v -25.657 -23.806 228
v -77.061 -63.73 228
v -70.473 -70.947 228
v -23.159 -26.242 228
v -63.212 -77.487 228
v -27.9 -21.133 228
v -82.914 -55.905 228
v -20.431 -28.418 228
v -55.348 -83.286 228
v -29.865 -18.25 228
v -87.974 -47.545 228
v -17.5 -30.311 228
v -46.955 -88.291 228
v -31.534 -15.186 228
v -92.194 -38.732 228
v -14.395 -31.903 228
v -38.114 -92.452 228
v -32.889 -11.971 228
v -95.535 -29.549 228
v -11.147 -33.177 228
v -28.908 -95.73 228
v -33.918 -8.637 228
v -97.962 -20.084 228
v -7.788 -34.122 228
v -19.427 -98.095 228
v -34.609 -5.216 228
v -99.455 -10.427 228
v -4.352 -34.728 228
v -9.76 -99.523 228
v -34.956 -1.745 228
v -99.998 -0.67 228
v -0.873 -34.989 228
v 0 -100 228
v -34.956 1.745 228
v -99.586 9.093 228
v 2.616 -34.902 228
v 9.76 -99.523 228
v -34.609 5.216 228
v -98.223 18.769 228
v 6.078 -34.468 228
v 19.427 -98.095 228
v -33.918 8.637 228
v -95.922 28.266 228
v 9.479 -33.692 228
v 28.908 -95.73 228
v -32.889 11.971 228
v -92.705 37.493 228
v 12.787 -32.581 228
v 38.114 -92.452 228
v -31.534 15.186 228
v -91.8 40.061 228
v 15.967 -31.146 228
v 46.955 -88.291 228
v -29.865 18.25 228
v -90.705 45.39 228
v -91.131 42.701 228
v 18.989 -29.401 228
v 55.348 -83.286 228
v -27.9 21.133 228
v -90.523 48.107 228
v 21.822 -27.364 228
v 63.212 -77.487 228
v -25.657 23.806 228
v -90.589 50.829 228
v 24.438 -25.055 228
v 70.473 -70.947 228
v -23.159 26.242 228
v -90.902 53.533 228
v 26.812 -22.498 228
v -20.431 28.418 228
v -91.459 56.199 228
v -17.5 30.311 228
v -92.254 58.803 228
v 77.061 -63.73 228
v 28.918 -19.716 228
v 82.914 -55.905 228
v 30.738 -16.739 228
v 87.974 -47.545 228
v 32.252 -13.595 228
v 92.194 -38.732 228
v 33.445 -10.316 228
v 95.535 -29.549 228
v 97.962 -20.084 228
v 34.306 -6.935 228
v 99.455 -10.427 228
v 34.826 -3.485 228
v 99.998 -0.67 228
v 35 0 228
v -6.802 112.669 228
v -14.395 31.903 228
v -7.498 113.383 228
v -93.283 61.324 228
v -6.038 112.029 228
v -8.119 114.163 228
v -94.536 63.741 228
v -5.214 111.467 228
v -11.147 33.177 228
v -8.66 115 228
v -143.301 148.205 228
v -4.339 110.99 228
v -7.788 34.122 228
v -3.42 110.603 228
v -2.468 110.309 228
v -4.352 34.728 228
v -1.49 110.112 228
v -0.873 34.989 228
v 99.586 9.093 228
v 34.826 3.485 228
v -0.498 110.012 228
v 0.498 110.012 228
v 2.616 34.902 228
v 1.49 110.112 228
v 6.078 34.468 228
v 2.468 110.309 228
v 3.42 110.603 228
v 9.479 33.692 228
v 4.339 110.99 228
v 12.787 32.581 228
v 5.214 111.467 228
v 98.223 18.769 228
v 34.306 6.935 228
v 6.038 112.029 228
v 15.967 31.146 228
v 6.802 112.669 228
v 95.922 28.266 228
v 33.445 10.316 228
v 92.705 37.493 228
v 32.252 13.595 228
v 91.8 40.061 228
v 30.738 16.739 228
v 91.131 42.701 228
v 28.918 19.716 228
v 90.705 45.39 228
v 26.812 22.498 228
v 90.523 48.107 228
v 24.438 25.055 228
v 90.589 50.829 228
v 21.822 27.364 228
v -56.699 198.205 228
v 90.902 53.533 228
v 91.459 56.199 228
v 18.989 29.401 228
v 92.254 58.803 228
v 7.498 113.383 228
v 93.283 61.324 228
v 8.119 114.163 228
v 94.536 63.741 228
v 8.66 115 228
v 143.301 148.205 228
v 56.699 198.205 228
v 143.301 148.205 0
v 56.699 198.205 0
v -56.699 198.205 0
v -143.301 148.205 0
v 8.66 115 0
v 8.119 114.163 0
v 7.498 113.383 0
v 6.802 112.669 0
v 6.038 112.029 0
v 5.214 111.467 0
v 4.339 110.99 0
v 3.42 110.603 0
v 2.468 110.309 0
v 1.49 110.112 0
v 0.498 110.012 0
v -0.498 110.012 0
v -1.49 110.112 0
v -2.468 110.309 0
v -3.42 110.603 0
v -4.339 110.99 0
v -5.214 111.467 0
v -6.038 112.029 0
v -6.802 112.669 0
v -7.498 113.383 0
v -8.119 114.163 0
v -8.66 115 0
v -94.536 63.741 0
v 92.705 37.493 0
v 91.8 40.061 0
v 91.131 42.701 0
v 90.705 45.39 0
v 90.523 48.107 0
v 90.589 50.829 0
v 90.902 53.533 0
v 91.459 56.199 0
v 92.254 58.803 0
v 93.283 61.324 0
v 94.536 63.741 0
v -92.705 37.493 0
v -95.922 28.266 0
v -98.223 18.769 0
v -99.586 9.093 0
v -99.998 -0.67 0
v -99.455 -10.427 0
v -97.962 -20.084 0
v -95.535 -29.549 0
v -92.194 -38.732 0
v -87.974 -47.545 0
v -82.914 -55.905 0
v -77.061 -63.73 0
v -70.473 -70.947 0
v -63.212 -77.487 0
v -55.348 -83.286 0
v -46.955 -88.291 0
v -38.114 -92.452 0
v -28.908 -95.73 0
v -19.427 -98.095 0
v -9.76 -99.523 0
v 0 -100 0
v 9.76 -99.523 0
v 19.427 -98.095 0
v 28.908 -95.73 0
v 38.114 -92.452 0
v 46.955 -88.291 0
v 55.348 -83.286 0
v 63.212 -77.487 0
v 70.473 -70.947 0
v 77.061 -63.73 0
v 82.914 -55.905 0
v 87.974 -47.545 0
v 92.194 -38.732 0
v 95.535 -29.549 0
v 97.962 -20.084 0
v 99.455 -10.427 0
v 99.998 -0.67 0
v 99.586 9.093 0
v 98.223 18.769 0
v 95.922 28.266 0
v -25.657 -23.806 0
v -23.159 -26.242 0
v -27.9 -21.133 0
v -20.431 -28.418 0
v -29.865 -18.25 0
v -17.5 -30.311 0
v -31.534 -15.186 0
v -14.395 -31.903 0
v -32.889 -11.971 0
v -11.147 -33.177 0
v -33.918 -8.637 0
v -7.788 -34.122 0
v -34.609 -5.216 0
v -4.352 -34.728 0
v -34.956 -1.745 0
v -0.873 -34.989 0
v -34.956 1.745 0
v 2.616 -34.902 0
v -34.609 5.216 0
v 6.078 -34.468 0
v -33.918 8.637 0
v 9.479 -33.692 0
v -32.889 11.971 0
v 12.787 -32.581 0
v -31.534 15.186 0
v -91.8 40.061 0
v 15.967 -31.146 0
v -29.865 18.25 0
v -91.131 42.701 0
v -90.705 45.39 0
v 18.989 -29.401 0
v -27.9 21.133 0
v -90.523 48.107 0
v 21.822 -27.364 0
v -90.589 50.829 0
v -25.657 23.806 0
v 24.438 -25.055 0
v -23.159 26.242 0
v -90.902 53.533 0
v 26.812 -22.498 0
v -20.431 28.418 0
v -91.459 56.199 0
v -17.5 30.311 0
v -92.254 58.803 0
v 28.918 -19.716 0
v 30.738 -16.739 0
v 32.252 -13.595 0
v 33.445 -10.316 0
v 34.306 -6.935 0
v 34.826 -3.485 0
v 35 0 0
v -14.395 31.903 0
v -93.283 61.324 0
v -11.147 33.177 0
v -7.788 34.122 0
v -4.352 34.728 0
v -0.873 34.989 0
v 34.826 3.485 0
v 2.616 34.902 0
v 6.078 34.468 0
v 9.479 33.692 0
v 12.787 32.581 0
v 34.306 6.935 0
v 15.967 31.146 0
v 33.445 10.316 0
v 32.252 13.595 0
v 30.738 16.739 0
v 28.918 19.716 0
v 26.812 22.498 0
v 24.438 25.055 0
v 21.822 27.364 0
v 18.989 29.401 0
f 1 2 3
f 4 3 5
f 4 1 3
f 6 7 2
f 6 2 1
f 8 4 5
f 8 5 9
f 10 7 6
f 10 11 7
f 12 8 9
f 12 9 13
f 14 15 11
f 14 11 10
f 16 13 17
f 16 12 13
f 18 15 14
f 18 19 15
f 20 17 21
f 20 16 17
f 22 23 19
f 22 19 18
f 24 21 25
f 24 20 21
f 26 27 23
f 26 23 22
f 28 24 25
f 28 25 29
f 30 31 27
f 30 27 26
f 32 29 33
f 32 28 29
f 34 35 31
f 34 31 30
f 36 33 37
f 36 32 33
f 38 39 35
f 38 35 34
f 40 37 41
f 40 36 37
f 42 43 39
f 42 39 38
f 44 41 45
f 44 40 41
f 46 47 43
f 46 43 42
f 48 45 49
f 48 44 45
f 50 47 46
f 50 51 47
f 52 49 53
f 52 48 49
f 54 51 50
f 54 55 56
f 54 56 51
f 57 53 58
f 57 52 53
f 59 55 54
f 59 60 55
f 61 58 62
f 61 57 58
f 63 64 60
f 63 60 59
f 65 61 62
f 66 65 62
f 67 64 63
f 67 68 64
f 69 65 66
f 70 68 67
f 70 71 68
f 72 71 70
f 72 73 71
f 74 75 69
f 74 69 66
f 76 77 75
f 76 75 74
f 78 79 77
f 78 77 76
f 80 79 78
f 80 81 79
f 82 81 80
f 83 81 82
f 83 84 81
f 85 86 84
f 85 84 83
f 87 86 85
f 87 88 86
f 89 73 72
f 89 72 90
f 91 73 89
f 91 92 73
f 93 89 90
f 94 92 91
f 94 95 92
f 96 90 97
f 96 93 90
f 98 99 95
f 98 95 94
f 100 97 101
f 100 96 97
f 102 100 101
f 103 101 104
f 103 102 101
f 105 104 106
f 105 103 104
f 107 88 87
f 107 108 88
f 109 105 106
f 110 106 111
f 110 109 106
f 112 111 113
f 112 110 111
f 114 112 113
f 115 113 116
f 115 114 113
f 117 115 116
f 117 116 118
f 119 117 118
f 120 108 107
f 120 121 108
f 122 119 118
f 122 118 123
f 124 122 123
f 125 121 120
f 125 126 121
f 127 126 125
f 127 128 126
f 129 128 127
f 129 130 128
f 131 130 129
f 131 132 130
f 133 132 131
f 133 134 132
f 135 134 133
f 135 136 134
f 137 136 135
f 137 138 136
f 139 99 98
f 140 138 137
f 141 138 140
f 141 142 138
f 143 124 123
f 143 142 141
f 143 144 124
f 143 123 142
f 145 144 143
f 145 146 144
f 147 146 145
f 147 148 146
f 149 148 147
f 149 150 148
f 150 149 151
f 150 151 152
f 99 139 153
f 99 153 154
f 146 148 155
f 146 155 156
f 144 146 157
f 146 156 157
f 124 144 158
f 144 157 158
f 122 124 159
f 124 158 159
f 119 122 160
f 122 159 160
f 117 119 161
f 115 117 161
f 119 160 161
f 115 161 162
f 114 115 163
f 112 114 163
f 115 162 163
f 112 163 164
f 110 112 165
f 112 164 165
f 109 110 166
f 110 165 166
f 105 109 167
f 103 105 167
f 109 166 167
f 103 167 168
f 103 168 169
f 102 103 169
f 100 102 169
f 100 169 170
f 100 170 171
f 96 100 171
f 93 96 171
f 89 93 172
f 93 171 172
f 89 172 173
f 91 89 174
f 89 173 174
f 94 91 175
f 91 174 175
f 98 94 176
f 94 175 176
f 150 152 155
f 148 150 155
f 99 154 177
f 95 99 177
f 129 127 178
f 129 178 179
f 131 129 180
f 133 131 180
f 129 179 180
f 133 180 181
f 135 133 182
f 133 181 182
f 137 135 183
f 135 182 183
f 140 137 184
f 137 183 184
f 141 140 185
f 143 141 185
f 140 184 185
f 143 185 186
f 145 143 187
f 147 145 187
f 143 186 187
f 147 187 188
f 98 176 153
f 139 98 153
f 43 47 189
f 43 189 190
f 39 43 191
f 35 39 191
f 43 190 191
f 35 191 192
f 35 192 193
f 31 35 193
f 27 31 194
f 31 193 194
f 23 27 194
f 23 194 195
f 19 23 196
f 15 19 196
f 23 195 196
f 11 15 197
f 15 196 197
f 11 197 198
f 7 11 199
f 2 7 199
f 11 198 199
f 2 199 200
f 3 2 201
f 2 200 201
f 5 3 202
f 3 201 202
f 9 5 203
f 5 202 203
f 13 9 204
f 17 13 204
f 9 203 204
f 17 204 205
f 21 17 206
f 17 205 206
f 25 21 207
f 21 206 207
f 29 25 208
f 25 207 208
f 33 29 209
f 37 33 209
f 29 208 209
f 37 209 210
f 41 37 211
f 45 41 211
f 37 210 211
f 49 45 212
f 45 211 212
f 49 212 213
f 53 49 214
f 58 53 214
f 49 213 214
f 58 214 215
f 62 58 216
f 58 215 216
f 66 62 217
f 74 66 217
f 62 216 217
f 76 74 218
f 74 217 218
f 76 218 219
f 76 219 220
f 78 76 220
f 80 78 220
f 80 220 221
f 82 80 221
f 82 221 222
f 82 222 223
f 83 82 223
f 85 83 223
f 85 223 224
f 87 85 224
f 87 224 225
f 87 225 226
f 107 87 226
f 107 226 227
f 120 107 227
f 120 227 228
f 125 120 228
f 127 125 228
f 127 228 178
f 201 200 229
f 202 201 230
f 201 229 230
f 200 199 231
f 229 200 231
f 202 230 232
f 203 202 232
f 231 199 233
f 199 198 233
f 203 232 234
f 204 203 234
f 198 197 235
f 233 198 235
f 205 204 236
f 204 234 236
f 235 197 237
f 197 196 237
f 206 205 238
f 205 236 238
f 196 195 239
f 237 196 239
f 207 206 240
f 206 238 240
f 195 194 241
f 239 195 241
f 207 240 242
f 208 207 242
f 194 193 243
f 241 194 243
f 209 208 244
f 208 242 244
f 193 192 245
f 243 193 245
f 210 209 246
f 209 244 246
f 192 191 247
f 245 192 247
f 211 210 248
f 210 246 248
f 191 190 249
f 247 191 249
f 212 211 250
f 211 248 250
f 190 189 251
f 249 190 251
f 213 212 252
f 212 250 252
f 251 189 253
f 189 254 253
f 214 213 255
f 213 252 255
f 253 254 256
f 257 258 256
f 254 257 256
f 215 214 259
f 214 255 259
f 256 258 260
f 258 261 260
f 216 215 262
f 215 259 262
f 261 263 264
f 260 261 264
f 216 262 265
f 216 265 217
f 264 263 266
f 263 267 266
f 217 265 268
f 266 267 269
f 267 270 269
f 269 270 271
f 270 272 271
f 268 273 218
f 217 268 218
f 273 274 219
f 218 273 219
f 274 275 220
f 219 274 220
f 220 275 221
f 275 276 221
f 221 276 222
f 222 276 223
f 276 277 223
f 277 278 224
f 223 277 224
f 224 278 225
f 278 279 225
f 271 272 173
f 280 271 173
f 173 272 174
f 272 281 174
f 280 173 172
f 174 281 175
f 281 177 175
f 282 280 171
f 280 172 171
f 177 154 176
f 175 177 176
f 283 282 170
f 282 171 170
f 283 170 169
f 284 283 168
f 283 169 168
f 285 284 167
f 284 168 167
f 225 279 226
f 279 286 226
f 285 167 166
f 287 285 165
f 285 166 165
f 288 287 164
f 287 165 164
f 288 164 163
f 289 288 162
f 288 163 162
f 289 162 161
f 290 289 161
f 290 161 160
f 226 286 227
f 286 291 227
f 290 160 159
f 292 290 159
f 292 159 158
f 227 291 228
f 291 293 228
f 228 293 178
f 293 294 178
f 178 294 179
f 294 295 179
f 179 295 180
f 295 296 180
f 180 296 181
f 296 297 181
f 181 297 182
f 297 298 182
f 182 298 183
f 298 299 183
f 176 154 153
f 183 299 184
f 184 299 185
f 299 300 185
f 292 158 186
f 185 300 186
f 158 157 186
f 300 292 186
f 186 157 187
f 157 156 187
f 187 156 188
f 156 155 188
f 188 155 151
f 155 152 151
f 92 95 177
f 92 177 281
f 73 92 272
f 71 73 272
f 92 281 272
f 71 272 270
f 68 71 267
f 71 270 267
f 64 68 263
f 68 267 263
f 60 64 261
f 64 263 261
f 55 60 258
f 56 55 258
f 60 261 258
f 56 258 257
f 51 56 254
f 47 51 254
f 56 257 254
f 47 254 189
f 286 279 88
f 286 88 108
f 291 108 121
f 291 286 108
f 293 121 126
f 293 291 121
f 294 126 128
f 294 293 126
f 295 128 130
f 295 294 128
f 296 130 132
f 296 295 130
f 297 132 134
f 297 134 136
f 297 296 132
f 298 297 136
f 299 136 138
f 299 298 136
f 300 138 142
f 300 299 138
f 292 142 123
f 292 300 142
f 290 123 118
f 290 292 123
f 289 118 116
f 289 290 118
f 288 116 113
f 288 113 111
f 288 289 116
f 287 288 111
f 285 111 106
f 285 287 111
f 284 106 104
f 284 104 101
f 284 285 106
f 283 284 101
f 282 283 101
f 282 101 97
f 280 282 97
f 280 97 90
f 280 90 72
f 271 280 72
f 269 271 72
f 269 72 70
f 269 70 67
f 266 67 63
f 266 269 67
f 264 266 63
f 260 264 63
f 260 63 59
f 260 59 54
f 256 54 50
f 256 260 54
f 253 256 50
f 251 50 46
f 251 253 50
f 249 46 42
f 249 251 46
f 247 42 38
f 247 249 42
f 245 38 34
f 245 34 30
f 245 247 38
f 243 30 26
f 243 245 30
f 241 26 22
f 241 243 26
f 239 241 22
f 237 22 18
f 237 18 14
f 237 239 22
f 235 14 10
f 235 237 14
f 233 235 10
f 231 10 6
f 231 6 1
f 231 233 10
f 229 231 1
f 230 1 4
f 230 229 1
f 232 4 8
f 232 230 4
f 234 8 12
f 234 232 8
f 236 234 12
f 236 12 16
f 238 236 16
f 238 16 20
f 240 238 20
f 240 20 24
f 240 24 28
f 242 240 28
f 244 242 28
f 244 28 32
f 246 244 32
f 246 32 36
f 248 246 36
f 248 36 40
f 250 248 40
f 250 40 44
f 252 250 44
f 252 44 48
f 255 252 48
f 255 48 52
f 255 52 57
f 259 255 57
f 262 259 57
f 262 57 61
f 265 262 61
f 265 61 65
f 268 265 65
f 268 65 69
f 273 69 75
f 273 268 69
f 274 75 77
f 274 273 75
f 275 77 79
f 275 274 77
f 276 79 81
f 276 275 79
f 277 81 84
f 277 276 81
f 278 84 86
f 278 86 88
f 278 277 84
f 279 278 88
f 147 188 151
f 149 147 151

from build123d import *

# Parameters (mm, degrees)
F0_R     = 35
F1_DEPTH = 228


with BuildPart() as f1:
    # F0 (on Top) → F1 (new body)
    with BuildSketch(Plane.XY):
        with BuildLine():
            ThreePointArc((-92.70522, 37.493228), (0, -100), (92.70522, 37.493228))
            ThreePointArc((92.70522, 37.493228), (90.589498, 50.828634), (94.536024, 63.741197))
            Line((94.536024, 63.741197), (143.30127, 148.205081))
            Line((143.30127, 148.205081), (56.69873, 198.205081))
            Line((56.69873, 198.205081), (8.660254, 115))
            ThreePointArc((8.660254, 115), (0, 110), (-8.660254, 115))
            Line((-8.660254, 115), (-56.69873, 198.205081))
            Line((-56.69873, 198.205081), (-143.30127, 148.205081))
            Line((-143.30127, 148.205081), (-94.536024, 63.741197))
            ThreePointArc((-94.536024, 63.741197), (-90.589498, 50.828634), (-92.70522, 37.493228))
        make_face()
        Circle(F0_R, mode=Mode.SUBTRACT)
    extrude(amount=F1_DEPTH)


solid = f1.part
